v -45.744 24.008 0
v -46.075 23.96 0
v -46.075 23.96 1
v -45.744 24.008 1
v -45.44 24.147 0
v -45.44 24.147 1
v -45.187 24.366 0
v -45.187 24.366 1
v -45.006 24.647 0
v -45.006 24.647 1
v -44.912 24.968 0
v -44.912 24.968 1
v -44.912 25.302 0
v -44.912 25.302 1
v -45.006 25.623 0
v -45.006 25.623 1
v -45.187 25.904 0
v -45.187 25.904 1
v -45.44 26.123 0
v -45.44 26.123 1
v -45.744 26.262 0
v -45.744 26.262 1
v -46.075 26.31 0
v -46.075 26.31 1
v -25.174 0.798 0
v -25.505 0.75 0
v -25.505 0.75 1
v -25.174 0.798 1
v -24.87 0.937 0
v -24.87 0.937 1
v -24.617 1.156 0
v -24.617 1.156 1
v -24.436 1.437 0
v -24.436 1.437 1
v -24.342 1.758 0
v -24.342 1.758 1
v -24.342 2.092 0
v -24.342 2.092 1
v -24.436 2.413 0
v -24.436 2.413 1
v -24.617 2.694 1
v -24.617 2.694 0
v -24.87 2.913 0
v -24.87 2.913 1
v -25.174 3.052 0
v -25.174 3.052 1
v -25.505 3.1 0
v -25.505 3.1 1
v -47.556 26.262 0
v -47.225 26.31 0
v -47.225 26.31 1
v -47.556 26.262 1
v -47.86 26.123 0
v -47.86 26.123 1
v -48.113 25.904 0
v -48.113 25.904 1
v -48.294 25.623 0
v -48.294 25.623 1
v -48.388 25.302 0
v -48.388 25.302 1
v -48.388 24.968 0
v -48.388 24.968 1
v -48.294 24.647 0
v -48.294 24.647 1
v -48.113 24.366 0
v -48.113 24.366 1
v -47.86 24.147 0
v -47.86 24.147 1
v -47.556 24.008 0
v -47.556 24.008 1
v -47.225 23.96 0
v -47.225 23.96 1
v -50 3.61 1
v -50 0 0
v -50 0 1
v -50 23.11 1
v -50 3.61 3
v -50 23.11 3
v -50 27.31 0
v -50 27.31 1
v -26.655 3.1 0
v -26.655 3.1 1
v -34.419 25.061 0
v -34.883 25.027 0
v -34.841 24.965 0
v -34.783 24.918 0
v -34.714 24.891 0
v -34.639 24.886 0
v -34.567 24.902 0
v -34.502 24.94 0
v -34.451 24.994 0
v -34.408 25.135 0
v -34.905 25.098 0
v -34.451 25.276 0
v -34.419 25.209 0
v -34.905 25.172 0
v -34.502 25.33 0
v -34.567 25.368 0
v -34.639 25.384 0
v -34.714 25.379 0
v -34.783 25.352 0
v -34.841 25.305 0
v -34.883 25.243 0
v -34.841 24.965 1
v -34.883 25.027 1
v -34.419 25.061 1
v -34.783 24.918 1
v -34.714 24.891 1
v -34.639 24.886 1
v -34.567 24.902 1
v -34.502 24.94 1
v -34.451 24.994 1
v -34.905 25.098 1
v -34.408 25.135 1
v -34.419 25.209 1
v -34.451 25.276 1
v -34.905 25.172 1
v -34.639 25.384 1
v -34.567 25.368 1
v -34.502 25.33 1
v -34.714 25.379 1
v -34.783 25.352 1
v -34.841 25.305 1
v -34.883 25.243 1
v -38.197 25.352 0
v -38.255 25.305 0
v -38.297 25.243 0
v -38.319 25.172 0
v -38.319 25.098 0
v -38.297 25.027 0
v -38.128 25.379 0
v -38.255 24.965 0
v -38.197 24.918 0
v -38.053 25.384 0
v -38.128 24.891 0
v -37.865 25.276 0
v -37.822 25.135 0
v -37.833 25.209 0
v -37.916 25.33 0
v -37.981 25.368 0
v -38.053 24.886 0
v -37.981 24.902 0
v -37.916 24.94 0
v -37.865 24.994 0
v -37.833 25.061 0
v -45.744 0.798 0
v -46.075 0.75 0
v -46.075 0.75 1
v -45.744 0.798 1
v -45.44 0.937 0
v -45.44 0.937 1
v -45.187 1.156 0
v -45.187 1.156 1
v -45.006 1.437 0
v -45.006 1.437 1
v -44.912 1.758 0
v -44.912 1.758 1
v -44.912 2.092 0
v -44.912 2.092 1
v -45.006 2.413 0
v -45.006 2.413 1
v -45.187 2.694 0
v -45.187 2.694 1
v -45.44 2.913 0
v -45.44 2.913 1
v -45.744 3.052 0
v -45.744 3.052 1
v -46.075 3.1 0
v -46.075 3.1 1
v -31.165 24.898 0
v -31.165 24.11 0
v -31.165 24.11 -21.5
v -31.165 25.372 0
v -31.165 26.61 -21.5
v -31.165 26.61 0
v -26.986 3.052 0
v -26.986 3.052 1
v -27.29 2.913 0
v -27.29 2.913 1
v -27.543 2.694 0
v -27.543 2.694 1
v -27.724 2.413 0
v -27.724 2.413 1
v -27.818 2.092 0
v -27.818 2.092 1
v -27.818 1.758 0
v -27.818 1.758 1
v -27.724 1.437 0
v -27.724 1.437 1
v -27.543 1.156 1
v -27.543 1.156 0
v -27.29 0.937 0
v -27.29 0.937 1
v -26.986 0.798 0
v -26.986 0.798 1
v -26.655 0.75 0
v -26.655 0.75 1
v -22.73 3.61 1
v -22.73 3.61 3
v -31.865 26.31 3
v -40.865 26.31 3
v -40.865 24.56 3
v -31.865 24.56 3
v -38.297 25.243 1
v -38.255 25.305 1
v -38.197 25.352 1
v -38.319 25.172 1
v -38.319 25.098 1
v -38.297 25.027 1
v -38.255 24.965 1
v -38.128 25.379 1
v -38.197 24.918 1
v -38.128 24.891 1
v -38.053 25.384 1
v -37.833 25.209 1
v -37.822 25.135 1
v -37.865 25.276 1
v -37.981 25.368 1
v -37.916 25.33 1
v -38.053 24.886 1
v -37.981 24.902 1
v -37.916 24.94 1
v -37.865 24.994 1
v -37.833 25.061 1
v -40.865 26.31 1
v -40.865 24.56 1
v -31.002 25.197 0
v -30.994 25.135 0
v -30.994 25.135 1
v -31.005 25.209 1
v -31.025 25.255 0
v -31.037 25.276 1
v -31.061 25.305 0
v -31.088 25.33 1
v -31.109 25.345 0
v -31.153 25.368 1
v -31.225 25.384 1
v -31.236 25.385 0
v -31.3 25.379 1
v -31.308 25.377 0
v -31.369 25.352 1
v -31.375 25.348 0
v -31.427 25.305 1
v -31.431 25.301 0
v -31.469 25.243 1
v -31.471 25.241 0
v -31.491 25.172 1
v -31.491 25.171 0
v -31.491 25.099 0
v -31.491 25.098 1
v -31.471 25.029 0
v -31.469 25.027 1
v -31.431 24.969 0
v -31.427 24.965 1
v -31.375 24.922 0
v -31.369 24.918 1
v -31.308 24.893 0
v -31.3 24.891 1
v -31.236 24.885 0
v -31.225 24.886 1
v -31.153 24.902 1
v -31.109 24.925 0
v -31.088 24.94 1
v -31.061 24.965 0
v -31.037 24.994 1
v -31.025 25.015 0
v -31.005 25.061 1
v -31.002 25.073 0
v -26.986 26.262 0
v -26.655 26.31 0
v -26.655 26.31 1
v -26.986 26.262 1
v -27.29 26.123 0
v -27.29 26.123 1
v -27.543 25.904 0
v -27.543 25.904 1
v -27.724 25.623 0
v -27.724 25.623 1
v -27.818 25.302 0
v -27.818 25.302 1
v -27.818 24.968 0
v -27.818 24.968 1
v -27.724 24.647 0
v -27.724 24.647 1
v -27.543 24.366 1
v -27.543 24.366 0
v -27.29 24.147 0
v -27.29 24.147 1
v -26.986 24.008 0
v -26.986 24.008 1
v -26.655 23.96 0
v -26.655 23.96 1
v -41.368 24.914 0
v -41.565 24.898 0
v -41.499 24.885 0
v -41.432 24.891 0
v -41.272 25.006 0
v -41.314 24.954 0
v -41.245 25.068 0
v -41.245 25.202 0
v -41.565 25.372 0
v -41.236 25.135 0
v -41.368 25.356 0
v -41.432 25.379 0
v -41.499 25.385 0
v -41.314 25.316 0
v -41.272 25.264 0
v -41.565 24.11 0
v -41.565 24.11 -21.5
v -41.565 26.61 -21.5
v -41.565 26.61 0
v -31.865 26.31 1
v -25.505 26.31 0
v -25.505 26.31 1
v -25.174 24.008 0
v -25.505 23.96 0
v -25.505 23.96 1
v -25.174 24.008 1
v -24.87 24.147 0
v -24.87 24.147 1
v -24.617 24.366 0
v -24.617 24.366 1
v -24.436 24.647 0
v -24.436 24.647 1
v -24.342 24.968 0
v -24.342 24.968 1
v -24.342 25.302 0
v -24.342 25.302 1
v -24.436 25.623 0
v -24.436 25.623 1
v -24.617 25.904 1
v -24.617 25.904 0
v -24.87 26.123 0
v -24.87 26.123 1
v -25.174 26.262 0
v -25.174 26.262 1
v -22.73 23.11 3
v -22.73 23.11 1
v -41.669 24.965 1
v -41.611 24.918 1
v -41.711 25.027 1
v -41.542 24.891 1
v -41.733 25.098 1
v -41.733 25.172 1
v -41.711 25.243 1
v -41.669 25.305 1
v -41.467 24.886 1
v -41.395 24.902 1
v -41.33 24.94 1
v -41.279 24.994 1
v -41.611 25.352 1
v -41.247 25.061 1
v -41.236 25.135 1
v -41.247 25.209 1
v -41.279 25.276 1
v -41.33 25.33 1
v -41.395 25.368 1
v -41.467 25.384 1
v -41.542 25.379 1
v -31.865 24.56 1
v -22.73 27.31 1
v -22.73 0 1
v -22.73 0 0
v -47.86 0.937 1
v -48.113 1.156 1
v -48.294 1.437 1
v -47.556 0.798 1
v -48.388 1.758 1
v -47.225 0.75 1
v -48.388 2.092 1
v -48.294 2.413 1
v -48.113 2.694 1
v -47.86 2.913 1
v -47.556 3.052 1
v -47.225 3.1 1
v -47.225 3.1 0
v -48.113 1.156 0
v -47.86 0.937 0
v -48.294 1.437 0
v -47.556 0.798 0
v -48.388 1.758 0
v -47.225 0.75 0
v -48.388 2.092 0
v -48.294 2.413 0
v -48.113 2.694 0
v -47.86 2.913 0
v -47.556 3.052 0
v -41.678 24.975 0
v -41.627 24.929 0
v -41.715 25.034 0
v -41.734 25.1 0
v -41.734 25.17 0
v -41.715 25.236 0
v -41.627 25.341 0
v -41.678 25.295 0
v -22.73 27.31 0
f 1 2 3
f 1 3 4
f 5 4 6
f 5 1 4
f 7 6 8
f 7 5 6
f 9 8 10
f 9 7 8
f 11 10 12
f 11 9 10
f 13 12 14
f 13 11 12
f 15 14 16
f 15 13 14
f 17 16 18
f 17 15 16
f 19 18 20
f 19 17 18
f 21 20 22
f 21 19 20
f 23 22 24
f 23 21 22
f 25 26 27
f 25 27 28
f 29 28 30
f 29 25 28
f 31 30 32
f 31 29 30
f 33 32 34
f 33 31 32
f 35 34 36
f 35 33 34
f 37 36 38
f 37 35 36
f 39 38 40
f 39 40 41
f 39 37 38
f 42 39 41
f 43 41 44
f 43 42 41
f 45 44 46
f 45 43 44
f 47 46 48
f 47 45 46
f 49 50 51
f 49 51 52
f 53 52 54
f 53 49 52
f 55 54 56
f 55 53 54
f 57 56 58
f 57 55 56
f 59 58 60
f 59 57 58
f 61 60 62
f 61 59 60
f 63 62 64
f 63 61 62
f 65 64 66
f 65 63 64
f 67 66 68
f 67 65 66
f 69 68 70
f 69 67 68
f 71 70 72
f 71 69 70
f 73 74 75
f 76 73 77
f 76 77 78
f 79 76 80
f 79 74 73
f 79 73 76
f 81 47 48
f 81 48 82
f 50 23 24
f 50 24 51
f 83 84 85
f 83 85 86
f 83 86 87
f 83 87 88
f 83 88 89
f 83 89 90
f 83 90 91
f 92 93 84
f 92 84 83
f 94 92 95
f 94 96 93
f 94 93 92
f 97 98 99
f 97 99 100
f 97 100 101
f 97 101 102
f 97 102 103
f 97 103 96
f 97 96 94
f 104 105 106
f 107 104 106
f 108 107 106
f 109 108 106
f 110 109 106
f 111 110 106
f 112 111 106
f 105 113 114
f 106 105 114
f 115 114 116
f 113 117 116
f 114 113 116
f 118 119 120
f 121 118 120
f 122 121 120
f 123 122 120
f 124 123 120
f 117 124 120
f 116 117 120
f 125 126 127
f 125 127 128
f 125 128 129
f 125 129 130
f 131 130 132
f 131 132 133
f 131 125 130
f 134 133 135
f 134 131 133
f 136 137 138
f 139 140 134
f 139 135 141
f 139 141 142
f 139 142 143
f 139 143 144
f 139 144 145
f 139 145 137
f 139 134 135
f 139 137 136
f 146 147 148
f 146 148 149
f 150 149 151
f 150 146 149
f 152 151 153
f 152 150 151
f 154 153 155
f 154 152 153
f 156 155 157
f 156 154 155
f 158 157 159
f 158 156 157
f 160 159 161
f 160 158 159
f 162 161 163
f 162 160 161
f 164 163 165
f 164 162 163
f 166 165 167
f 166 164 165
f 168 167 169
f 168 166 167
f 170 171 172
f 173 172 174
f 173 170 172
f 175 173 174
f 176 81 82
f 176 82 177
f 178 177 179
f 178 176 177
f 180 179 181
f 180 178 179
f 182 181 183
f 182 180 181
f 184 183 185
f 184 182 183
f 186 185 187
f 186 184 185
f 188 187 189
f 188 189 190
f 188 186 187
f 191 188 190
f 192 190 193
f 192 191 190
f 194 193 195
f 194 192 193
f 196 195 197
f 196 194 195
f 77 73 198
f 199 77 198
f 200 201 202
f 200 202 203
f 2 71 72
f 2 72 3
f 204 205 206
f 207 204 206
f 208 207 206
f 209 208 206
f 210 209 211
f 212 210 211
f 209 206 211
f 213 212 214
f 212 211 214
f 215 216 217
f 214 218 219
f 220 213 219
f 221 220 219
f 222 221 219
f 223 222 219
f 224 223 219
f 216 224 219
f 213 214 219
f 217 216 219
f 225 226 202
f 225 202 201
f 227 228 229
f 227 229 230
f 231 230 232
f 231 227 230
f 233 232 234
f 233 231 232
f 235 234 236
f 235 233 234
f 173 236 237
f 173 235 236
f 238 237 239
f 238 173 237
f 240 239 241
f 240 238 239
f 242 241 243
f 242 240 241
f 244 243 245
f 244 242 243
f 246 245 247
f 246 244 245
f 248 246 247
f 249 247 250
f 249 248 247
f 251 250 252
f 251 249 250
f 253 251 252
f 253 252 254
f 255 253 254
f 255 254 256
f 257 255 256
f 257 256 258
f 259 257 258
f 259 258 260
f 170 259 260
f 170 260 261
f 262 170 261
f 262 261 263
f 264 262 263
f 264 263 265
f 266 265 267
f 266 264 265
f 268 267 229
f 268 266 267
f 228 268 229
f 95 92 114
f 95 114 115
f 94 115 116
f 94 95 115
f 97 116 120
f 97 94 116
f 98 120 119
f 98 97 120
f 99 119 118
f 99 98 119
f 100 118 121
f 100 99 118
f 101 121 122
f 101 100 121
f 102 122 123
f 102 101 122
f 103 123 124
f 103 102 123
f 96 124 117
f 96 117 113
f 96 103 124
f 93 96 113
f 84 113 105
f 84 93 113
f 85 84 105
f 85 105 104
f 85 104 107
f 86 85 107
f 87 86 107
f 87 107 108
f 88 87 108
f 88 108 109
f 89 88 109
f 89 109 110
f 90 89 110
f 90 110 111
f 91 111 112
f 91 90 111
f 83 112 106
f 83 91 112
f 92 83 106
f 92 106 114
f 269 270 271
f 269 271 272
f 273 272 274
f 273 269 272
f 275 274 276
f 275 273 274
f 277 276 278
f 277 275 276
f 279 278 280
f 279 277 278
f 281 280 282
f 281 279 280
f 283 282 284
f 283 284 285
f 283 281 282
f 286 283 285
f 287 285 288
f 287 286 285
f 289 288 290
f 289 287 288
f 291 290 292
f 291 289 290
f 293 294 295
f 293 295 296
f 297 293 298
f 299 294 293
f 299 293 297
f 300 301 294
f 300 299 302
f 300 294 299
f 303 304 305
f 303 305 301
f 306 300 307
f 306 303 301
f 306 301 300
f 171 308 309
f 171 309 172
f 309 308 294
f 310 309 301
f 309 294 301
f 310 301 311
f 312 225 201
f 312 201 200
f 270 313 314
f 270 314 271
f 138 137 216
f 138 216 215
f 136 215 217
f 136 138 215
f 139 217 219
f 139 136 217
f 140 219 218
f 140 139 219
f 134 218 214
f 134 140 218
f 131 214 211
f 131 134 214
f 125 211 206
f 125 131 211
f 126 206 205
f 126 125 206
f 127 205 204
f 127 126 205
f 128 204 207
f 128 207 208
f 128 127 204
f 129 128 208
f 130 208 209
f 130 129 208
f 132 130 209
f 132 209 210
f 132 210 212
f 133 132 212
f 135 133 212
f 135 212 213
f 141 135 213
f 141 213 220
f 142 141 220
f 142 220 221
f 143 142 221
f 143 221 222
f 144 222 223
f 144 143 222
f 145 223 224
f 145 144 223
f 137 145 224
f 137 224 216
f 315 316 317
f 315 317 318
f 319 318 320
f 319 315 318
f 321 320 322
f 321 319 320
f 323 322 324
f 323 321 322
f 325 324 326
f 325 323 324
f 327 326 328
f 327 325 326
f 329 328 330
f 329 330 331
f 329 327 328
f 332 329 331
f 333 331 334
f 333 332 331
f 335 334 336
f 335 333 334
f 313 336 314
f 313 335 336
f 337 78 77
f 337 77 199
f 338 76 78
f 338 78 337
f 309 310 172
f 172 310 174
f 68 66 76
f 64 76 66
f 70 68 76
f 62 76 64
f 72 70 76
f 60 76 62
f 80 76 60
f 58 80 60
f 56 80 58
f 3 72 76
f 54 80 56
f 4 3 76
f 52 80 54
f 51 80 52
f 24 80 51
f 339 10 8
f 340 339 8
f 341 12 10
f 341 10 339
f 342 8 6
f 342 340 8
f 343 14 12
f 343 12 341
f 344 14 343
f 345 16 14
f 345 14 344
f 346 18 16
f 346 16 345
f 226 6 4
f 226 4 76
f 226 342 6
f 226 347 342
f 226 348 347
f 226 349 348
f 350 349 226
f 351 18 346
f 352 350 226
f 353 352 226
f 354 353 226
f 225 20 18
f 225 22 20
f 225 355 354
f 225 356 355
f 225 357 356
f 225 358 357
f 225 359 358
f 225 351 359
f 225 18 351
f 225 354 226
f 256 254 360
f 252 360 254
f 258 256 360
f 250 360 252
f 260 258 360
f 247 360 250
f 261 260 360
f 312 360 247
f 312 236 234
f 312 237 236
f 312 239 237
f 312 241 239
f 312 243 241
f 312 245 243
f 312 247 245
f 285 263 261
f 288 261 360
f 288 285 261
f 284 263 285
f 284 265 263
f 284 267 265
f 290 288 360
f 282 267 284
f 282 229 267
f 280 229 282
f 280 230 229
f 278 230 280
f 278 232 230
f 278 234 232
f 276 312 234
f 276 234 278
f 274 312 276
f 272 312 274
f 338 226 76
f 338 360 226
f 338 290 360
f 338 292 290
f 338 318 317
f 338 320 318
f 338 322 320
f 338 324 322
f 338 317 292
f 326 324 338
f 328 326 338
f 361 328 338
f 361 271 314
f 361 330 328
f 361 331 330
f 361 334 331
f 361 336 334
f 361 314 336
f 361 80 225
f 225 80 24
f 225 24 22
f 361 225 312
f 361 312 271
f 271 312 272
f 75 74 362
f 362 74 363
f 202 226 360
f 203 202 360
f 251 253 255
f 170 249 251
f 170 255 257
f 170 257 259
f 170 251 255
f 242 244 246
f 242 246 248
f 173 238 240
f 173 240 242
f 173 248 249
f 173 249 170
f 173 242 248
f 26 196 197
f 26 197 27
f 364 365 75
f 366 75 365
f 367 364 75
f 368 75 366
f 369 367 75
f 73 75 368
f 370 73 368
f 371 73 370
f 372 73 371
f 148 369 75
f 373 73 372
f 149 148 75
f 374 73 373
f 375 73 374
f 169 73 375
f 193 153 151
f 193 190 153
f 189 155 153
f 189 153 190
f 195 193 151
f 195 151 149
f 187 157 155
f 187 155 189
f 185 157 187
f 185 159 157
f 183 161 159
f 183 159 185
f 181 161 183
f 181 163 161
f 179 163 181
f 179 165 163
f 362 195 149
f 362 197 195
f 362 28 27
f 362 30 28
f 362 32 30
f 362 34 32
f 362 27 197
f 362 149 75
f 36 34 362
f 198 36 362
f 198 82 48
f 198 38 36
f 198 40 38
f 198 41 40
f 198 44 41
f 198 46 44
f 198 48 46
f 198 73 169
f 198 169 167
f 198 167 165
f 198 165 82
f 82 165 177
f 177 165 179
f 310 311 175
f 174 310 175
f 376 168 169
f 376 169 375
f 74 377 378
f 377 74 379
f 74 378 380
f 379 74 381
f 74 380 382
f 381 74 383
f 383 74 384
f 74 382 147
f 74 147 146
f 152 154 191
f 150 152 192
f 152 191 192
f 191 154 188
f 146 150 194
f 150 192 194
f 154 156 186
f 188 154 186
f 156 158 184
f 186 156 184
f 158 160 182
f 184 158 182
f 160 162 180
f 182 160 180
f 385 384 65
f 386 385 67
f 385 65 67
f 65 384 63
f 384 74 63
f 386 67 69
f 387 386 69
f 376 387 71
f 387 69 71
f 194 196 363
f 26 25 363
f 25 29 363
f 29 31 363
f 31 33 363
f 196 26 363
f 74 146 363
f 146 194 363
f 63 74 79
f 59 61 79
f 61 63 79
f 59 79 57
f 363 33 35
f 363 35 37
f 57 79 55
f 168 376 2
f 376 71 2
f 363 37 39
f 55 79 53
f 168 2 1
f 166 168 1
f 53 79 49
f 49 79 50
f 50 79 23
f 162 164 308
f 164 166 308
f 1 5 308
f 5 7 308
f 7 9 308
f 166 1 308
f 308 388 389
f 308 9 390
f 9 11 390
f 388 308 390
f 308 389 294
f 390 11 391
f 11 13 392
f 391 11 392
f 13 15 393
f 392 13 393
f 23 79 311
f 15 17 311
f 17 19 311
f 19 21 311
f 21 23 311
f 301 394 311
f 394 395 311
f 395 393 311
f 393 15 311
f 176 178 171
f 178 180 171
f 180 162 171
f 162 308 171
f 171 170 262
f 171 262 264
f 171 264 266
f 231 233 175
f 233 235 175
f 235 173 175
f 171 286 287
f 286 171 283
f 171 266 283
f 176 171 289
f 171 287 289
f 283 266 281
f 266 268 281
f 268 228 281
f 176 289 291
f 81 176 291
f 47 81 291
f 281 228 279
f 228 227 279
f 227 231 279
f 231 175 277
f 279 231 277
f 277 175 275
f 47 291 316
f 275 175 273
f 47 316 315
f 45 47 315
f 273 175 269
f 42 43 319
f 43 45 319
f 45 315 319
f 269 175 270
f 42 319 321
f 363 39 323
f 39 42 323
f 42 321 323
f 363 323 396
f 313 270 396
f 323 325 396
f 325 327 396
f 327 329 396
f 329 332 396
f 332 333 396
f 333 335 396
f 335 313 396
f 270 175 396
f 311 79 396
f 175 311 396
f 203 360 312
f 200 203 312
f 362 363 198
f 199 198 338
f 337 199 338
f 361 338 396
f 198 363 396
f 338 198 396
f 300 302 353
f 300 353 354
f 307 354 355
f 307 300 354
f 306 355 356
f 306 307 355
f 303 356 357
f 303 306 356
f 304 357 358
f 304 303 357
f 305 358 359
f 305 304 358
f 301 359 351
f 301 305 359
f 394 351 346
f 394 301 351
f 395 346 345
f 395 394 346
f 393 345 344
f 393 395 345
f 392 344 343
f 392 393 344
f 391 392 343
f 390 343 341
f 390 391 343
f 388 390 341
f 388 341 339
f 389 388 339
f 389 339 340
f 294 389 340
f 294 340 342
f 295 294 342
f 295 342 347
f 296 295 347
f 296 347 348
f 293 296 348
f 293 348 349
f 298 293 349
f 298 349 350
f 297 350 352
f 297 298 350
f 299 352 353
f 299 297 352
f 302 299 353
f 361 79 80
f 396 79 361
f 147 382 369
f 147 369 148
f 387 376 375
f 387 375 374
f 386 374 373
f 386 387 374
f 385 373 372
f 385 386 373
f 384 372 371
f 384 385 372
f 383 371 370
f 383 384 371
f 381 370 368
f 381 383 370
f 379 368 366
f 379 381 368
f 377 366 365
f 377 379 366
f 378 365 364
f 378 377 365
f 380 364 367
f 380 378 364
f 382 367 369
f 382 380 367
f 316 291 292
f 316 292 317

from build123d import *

# Parameters (mm, degrees)
SKETCH007_W      = 27.27
SKETCH007_H      = 19.5
SKETCH007_W_2    = 9
SKETCH007_H_2    = 1.75
EXTRUDE006_DEPTH = 2
SKETCH006_W      = 27.27
SKETCH006_H      = 27.31
SKETCH006_R      = 0.25
EXTRUDE007_DEPTH = 1
SKETCH008_W      = 10.4
SKETCH008_H      = 2.5
EXTRUDE008_DEPTH = 8.5
SKETCH009_W      = 10.4
SKETCH009_H      = 2.5
EXTRUDE009_DEPTH = 21.5


with BuildPart() as extrude_diplay_parts:
    # Sketch007 → Extrude006 (new body)
    with BuildSketch(Plane.XY):
        with Locations((13.635, 13.36)):
            Rectangle(SKETCH007_W, SKETCH007_H)
        with Locations((13.635, 25.435)):
            Rectangle(SKETCH007_W_2, SKETCH007_H_2)
    extrude(amount=EXTRUDE006_DEPTH)


with BuildPart() as extrude_diplay_parts_1:
    # Extrude006 placement: moved
    add(extrude_diplay_parts.part.moved(Location((0, 0, 1))))


with BuildPart() as extrude_display_base:
    # Sketch006 → Extrude007 (new body)
    with BuildSketch(Plane.XY):
        with Locations((13.635, 13.655)):
            Rectangle(SKETCH006_W, SKETCH006_H)
        with Locations((8.514, 25.135)):
            Circle(SKETCH006_R, mode=Mode.SUBTRACT)
        with Locations((11.928, 25.135)):
            Circle(SKETCH006_R, mode=Mode.SUBTRACT)
        with Locations((15.342, 25.135)):
            Circle(SKETCH006_R, mode=Mode.SUBTRACT)
        with Locations((18.756, 25.135)):
            Circle(SKETCH006_R, mode=Mode.SUBTRACT)
        with BuildLine():
            ThreePointArc((2.775, 26.31), (1.6, 25.135), (2.775, 23.96))
            Line((2.775, 23.96), (3.925, 23.96))
            ThreePointArc((3.925, 23.96), (5.1, 25.135), (3.925, 26.31))
            Line((3.925, 26.31), (2.775, 26.31))
        make_face(mode=Mode.SUBTRACT)
        with BuildLine():
            ThreePointArc((23.345, 26.31), (22.17, 25.135), (23.345, 23.96))
            Line((23.345, 23.96), (24.495, 23.96))
            ThreePointArc((24.495, 23.96), (25.67, 25.135), (24.495, 26.31))
            Line((24.495, 26.31), (23.345, 26.31))
        make_face(mode=Mode.SUBTRACT)
        with BuildLine():
            ThreePointArc((2.775, 3.1), (1.6, 1.925), (2.775, 0.75))
            Line((2.775, 0.75), (3.925, 0.75))
            ThreePointArc((3.925, 0.75), (5.1, 1.925), (3.925, 3.1))
            Line((3.925, 3.1), (2.775, 3.1))
        make_face(mode=Mode.SUBTRACT)
        with BuildLine():
            ThreePointArc((23.345, 3.1), (22.17, 1.925), (23.345, 0.75))
            Line((23.345, 0.75), (24.495, 0.75))
            ThreePointArc((24.495, 0.75), (25.67, 1.925), (24.495, 3.1))
            Line((24.495, 3.1), (23.345, 3.1))
        make_face(mode=Mode.SUBTRACT)
    extrude(amount=EXTRUDE007_DEPTH)


with BuildPart() as fusion_display:
    # Sketch008 → Extrude008 (new body)
    with BuildSketch(Plane.XY):
        with Locations((13.635, 25.36)):
            Rectangle(SKETCH008_W, SKETCH008_H)
    extrude(amount=-EXTRUDE008_DEPTH)

    # Fusion002: union Extrude_Diplay_parts, Extrude_Display_base
    add(extrude_diplay_parts_1.part)
    add(extrude_display_base.part)


with BuildPart() as fusion_diplayandconnector:
    # Sketch009 → Extrude009 (new body)
    with BuildSketch(Plane.XY):
        with Locations((13.635, 25.36)):
            Rectangle(SKETCH009_W, SKETCH009_H)
    extrude(amount=-EXTRUDE009_DEPTH)

    # Fusion003: union Fusion_Display
    add(fusion_display.part)


with BuildPart() as fusion_diplayandconnector_1:
    # Fusion003 placement: moved
    add(fusion_diplayandconnector.part.moved(Location((-50, 0, 0))))


solid = fusion_diplayandconnector_1.part
